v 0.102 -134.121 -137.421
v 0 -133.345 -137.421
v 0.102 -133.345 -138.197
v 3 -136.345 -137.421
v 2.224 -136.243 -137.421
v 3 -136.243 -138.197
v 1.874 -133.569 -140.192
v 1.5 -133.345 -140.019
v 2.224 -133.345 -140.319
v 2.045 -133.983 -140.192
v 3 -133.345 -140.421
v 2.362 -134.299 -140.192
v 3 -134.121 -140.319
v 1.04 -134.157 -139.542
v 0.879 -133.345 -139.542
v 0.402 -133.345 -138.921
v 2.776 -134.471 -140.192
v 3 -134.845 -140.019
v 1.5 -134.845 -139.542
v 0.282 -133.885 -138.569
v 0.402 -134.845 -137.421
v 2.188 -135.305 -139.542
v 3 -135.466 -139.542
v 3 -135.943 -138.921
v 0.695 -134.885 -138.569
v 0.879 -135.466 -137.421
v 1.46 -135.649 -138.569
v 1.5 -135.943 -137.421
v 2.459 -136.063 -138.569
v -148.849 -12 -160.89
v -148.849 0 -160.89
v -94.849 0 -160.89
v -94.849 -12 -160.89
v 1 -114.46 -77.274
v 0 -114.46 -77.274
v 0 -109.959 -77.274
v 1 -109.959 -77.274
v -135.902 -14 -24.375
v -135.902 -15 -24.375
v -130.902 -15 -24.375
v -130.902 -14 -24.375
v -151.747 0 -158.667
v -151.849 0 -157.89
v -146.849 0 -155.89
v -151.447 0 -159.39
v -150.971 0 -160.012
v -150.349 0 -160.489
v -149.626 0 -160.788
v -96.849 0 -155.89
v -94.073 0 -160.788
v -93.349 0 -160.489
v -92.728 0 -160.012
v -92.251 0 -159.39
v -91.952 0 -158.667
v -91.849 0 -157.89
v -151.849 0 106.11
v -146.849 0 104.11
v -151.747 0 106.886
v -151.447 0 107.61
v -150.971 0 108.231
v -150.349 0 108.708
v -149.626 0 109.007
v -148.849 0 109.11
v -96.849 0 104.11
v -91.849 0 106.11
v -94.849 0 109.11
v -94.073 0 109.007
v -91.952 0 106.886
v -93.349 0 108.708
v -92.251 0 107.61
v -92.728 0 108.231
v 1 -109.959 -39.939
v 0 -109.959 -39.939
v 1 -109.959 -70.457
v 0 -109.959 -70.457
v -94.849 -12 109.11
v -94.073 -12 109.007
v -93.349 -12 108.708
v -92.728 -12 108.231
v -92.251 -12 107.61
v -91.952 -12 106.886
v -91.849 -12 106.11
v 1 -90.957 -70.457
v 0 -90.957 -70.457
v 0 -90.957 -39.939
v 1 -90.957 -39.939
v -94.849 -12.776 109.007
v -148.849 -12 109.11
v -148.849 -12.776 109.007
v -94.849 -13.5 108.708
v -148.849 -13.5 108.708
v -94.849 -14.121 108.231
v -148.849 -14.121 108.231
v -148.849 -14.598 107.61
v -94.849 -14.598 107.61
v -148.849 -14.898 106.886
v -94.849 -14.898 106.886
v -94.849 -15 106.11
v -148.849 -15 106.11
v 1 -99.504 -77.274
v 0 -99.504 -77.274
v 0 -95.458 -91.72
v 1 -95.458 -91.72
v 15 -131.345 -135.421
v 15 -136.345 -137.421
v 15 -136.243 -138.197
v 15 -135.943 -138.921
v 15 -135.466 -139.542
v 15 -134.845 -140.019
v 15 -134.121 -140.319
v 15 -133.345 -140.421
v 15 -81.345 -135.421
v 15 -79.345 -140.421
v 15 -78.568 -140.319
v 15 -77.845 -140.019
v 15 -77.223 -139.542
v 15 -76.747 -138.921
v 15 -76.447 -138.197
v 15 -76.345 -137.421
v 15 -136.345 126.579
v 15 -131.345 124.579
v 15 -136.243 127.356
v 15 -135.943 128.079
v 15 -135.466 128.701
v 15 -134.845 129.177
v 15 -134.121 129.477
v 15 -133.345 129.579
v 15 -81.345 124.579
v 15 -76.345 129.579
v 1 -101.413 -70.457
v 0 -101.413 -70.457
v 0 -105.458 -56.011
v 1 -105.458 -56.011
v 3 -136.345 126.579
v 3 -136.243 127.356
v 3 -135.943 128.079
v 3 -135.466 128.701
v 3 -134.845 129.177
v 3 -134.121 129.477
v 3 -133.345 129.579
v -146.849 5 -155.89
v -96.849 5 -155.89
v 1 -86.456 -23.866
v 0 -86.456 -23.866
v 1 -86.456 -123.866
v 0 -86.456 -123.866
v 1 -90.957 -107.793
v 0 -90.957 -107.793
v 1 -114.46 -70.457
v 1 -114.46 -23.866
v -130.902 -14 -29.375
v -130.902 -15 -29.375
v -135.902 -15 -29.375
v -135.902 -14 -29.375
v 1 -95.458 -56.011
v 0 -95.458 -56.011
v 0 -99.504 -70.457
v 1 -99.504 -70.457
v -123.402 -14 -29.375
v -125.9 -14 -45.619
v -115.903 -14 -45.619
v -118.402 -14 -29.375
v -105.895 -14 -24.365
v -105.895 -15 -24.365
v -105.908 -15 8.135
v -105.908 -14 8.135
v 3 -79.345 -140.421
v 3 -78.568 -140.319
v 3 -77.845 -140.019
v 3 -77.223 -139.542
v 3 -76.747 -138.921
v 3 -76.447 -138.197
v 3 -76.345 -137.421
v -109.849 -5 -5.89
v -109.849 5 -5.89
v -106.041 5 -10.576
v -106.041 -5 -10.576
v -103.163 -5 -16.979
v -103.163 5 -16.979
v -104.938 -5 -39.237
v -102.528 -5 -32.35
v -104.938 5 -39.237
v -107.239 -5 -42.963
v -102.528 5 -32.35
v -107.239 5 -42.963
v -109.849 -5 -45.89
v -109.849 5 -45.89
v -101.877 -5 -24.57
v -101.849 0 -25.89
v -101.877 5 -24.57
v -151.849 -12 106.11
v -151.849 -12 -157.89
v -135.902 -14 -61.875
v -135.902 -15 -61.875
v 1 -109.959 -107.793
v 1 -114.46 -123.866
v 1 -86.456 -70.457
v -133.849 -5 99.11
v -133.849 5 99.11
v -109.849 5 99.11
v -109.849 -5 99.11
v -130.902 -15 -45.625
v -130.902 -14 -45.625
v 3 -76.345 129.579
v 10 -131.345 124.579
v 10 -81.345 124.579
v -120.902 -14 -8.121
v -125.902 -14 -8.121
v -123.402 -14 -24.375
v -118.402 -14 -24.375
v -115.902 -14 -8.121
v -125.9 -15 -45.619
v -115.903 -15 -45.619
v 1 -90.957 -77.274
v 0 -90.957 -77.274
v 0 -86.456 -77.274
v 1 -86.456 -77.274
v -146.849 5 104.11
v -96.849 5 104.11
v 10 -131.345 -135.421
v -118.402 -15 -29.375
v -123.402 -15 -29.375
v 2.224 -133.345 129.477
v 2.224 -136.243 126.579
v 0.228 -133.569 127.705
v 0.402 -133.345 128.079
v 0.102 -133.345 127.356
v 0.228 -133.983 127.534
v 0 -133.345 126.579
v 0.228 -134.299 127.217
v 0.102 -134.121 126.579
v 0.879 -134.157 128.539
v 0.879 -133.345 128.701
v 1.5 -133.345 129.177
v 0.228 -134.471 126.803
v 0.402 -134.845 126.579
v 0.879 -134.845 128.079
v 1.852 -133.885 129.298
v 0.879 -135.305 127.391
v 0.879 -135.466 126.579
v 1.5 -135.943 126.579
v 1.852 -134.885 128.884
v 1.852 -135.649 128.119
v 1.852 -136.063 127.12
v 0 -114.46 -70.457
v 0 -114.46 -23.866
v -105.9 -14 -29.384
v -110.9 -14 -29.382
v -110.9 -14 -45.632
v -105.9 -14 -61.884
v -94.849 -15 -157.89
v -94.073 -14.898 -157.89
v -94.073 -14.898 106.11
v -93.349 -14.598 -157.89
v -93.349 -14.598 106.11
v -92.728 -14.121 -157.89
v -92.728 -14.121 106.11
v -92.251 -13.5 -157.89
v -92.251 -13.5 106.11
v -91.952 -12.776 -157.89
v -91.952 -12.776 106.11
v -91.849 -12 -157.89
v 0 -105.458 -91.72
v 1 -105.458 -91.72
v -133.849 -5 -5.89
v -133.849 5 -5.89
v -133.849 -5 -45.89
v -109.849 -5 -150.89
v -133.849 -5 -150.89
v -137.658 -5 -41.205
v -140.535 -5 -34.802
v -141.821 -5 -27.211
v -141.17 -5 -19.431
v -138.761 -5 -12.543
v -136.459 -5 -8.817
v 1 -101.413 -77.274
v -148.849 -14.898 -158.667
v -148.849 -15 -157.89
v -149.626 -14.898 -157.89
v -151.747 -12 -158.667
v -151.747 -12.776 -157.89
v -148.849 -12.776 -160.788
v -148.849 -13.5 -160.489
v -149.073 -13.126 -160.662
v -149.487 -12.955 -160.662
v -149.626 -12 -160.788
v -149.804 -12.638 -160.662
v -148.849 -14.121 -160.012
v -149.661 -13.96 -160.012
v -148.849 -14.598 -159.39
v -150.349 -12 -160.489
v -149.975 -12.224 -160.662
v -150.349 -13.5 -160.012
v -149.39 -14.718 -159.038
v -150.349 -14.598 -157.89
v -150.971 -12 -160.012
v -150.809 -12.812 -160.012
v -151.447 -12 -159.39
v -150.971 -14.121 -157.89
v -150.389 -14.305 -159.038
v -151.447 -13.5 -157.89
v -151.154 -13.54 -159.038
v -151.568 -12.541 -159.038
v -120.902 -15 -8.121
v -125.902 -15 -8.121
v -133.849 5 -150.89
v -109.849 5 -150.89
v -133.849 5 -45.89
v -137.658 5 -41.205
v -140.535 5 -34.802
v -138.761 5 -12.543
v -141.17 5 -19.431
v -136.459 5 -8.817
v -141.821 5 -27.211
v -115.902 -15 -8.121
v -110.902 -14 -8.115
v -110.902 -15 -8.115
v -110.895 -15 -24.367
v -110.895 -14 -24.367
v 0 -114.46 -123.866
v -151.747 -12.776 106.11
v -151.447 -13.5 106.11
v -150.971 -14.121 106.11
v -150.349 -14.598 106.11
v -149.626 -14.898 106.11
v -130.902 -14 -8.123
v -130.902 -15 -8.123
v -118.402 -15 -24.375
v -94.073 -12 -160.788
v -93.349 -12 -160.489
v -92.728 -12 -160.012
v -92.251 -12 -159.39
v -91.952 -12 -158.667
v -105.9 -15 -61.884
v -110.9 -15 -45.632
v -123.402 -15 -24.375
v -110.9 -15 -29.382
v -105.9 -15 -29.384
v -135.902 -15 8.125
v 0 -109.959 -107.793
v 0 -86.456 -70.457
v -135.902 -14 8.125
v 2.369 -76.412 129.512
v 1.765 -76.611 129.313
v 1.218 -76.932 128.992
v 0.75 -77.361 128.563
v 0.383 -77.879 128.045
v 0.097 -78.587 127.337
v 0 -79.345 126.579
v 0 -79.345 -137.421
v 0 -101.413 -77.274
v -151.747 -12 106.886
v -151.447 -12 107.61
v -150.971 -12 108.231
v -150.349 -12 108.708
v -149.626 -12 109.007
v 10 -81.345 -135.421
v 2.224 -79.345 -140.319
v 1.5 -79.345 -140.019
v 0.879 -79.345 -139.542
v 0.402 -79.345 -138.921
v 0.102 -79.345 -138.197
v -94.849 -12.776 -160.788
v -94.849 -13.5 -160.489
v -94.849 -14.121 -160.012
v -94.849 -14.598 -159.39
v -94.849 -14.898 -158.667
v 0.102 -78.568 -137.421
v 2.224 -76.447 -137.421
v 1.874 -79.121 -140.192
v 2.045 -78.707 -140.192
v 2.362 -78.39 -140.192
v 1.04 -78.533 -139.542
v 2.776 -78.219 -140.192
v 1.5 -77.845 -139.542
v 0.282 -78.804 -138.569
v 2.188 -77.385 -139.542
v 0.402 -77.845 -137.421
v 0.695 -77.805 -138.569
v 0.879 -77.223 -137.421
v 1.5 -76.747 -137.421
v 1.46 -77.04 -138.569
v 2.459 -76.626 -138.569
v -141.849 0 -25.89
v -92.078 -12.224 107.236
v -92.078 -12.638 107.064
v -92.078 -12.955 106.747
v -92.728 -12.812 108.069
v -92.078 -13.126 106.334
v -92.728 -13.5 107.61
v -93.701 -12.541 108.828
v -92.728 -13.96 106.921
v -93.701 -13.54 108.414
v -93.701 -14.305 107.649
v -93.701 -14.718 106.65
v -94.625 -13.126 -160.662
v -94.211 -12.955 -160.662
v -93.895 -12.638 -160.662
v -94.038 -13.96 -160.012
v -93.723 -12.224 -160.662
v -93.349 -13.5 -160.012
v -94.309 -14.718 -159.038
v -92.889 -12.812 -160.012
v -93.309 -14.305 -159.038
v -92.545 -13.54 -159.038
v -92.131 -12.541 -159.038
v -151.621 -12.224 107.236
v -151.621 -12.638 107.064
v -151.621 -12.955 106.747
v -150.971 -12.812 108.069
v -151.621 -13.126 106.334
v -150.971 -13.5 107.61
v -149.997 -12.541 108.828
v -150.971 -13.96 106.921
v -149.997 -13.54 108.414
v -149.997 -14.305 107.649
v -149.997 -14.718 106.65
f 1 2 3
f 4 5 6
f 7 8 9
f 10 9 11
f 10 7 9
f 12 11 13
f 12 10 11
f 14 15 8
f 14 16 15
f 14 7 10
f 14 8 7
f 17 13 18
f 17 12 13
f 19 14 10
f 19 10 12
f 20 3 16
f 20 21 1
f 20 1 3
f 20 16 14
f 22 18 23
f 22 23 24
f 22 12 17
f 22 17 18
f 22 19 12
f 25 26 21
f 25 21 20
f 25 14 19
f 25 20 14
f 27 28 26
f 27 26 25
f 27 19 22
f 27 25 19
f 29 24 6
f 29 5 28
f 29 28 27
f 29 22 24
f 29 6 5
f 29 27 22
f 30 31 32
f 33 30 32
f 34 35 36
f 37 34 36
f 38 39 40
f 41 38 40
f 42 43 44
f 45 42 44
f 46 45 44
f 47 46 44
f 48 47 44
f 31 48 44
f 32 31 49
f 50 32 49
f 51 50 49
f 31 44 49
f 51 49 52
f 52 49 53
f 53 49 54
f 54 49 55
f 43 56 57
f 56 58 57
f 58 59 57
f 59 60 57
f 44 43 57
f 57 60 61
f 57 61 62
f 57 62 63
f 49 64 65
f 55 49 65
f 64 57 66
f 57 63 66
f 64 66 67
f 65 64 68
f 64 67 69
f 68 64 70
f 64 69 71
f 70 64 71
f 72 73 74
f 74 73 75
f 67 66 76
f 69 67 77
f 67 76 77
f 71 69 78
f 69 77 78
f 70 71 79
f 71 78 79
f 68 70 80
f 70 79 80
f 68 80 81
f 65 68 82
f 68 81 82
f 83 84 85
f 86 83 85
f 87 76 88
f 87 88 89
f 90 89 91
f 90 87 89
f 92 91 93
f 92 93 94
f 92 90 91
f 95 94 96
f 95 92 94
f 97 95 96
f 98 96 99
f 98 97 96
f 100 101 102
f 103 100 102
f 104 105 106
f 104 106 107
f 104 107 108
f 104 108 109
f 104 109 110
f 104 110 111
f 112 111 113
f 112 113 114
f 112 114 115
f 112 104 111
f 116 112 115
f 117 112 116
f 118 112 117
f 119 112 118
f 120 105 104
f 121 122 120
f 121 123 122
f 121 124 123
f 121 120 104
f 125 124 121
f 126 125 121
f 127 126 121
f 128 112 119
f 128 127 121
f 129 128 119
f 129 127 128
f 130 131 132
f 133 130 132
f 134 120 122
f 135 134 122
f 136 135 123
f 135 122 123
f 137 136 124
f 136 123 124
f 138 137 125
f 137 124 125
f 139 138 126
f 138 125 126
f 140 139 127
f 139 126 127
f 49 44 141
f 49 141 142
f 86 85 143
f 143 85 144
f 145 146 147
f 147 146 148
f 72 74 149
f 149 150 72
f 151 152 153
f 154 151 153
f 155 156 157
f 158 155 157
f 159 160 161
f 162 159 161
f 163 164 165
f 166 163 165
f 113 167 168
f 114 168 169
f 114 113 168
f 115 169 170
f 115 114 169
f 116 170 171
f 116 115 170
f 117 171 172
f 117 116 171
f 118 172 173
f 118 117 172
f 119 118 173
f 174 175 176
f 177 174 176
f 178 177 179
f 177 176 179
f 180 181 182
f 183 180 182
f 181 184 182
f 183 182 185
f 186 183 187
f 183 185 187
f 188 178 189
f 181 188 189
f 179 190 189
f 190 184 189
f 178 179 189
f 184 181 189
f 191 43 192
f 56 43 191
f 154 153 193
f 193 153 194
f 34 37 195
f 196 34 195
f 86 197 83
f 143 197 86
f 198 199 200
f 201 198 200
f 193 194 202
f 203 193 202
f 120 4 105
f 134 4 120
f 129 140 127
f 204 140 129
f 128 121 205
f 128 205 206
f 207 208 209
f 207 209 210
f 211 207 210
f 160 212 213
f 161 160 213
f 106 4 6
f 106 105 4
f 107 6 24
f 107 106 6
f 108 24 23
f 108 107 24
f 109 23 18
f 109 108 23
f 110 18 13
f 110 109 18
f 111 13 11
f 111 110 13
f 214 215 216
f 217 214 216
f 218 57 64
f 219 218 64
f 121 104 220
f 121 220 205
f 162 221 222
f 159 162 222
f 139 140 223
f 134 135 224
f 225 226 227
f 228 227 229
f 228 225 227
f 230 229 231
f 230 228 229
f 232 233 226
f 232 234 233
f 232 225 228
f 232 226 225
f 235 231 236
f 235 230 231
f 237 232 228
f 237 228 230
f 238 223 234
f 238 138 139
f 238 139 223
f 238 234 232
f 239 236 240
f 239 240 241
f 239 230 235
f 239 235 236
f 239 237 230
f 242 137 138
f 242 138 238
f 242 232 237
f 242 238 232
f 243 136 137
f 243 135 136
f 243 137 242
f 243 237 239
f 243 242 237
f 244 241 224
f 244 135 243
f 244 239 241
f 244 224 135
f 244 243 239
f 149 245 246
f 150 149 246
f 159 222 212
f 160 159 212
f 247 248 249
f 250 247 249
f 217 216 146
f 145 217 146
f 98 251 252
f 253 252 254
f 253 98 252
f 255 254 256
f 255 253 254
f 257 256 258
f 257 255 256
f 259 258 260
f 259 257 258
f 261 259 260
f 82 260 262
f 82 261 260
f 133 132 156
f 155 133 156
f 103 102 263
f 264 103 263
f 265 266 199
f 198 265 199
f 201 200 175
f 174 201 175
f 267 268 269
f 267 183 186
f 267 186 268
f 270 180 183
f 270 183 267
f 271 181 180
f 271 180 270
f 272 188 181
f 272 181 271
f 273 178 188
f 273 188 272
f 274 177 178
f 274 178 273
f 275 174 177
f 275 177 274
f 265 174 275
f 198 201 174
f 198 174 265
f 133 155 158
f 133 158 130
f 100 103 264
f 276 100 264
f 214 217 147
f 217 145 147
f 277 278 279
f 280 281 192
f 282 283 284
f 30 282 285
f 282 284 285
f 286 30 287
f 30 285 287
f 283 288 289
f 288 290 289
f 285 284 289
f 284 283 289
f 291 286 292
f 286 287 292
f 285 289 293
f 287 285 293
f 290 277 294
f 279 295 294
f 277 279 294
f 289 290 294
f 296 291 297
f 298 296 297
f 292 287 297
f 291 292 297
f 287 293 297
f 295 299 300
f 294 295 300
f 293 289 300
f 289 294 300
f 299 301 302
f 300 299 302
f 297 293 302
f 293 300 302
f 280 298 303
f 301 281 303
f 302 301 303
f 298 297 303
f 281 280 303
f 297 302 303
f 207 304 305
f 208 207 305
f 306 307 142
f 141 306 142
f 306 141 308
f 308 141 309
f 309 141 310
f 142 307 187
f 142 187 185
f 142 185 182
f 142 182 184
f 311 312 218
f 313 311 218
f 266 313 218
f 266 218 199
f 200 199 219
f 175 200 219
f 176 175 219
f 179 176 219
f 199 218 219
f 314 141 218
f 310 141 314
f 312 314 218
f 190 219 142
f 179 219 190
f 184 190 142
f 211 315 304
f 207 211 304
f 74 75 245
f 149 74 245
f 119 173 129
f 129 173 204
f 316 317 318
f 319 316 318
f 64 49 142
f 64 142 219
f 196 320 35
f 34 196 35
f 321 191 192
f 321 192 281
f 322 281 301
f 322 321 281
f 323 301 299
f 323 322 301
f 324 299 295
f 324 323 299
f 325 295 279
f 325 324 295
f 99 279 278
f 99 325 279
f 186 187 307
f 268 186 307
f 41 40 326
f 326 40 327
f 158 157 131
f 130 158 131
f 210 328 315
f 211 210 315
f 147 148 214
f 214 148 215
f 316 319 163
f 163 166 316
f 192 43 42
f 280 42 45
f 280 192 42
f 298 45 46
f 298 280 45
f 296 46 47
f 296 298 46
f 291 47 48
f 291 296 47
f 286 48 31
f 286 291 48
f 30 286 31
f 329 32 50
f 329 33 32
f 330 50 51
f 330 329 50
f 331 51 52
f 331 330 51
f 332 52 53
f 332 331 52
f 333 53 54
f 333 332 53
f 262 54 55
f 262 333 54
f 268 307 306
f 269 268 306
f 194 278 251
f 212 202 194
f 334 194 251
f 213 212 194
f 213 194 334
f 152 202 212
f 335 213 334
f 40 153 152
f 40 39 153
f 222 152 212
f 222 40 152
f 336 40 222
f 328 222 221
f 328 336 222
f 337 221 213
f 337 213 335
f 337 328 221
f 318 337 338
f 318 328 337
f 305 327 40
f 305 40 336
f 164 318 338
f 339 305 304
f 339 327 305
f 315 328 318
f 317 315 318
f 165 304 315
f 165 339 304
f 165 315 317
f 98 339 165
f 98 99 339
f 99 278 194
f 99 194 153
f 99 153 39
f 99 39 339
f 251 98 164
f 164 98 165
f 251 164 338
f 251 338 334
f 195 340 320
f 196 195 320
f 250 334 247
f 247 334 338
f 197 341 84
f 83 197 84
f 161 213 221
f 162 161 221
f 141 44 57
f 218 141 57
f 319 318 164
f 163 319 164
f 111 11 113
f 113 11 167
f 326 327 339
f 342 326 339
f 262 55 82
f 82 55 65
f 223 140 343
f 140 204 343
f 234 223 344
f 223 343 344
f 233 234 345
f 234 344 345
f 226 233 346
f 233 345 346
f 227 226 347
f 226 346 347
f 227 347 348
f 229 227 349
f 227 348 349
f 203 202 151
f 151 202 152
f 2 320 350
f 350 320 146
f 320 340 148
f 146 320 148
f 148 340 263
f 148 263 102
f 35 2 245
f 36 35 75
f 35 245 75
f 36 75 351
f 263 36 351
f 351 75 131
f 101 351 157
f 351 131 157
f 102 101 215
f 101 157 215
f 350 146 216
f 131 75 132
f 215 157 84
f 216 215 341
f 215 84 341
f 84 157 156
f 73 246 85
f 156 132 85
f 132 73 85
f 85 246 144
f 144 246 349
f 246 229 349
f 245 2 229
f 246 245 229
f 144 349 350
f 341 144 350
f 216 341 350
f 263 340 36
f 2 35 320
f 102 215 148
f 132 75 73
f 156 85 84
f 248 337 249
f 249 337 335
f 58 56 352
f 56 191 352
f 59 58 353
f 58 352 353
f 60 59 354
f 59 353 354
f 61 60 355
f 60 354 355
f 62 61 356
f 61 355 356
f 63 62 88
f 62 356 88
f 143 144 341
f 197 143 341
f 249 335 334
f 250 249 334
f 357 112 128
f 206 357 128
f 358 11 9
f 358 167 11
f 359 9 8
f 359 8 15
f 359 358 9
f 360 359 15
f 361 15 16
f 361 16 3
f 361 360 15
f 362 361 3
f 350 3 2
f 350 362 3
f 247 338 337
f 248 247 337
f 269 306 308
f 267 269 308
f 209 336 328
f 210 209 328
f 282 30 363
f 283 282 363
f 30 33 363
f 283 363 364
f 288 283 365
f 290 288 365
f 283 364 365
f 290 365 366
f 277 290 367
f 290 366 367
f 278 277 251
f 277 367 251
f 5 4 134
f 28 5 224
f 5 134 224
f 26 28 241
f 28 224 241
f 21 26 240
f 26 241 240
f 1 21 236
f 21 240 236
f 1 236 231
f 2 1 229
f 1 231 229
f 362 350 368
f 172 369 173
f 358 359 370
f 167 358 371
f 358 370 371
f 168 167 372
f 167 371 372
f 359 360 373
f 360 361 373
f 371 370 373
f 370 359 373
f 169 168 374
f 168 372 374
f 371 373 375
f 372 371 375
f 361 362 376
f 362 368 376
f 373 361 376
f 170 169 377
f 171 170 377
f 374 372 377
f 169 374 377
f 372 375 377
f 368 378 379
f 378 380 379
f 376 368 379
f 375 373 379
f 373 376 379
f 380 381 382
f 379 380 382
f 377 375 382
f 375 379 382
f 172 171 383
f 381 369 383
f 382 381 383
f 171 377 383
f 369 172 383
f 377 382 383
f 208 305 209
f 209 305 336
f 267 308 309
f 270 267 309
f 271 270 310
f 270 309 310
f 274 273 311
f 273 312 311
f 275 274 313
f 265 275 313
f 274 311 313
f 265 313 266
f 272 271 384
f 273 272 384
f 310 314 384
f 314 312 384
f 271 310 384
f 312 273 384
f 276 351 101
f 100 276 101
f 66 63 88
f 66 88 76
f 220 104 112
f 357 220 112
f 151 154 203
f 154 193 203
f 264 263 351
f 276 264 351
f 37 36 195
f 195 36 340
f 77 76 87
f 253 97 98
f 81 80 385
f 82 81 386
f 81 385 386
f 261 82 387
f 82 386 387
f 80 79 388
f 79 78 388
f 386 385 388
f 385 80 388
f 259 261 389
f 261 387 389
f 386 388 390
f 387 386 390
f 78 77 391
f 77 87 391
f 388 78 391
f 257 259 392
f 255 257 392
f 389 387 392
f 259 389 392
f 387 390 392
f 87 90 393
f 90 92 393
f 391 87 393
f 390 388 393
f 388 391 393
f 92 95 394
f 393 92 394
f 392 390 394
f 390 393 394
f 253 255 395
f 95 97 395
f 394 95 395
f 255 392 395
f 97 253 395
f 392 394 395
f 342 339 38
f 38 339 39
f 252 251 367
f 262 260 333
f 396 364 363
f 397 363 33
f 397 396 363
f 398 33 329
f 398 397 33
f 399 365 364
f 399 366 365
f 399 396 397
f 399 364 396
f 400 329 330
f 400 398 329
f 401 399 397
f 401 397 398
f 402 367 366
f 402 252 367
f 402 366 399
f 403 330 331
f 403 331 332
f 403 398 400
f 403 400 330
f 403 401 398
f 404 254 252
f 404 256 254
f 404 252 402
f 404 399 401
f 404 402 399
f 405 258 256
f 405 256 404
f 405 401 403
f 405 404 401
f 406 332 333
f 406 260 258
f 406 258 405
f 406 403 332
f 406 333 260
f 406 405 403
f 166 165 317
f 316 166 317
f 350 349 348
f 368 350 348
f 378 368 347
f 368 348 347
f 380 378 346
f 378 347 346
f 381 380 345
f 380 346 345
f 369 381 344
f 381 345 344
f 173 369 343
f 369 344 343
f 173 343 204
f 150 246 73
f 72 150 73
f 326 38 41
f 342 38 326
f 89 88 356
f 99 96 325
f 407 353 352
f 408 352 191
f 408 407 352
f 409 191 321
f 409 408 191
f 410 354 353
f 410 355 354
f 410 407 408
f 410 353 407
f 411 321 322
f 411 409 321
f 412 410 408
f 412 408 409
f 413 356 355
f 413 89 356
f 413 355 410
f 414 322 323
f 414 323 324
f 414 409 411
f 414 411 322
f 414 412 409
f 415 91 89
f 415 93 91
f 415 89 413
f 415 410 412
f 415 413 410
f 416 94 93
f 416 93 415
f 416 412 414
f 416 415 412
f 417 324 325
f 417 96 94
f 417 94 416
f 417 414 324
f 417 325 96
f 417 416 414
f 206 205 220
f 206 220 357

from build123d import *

# Parameters (mm, degrees)
F0_W      = 60
F0_H      = 270
F2_DEPTH  = 15
F3_W      = 50
F3_H      = 260
F4_DEPTH  = 5
F1_W      = 60
F1_H      = 270
F5_DEPTH  = 15
F6_W      = 50
F6_H      = 260
F7_DEPTH  = 5
F9_DEPTH  = 10
F10_R     = 3
F11_R     = 3
F13_DEPTH = 1
F15_DEPTH = 1


# Not quite as in the source:
# - a feature names something its author has since deleted; it is built from what else it names


with BuildPart() as f2:
    # F0 (on Front) → F2 (new body)
    with BuildSketch(Plane.XZ):
        with Locations((-121.8493213905, -25.8904273567)):
            Rectangle(F0_W, F0_H)
    extrude(amount=F2_DEPTH)

    # F3 (on face) → F4 (join)
    with BuildSketch(Plane.XZ):
        with Locations((-121.8493213905, -25.8904273567)):
            Rectangle(F3_W, F3_H)
    extrude(amount=-F4_DEPTH)

    # F8 (on face) → F9 (cut)
    with BuildSketch(Plane(origin=(0, 5, 0), x_dir=(-1, 0, 0), z_dir=(0, 1, 0))):
        with BuildLine():
            Line((109.8493213905, -150.8904273567), (133.8493213905, -150.8904273567))
            Line((133.8493213905, -150.8904273567), (133.8493213905, -45.8904273567))
            add(Edge.make_bspline(
                [(109.8493213905, -45.8904273567), (121.8493213905, -57.1404273567), (133.8493213905, -45.8904273567)],
                knots=[2.4980915448, 2.4980915448, 2.4980915448, 3.7850937624, 3.7850937624, 3.7850937624], degree=2, weights=[1, 0.8, 1]))
            Line((109.8493213905, -45.8904273567), (109.8493213905, -150.8904273567))
        make_face()
        with BuildLine():
            add(Edge.make_bspline(
                [(133.8493213905, -5.8904273567), (128.5159880572, -0.8904273567), (121.8493213905, -0.8904273567)],
                knots=[5.6396841984, 5.6396841984, 5.6396841984, 6.2831853072, 6.2831853072, 6.2831853072], degree=2, weights=[1, 0.9486832981, 1]))
            Line((133.8493213905, -5.8904273567), (133.8493213905, 99.1095726433))
            Line((133.8493213905, 99.1095726433), (109.8493213905, 99.1095726433))
            Line((109.8493213905, 99.1095726433), (109.8493213905, -5.8904273567))
            add(Edge.make_bspline(
                [(121.8493213905, -0.8904273567), (115.1826547239, -0.8904273567), (109.8493213905, -5.8904273567)],
                knots=[0, 0, 0, 0.6435011088, 0.6435011088, 0.6435011088], degree=2, weights=[1, 0.9486832981, 1]))
        make_face()
        with BuildLine():
            Line((133.8493213905, -5.8904273567), (133.8493213905, -45.8904273567))
            add(Edge.make_bspline(
                [(133.8493213905, -45.8904273567), (155.1826547239, -25.8904273567), (133.8493213905, -5.8904273567)],
                knots=[3.7850937624, 3.7850937624, 3.7850937624, 5.6396841984, 5.6396841984, 5.6396841984], degree=2, weights=[1, 0.6, 1]))
        make_face()
        with BuildLine():
            add(Edge.make_bspline(
                [(109.8493213905, -45.8904273567), (121.8493213905, -57.1404273567), (133.8493213905, -45.8904273567)],
                knots=[2.4980915448, 2.4980915448, 2.4980915448, 3.7850937624, 3.7850937624, 3.7850937624], degree=2, weights=[1, 0.8, 1]))
            Line((133.8493213905, -45.8904273567), (133.8493213905, -5.8904273567))
            add(Edge.make_bspline(
                [(133.8493213905, -5.8904273567), (128.5159880572, -0.8904273567), (121.8493213905, -0.8904273567)],
                knots=[5.6396841984, 5.6396841984, 5.6396841984, 6.2831853072, 6.2831853072, 6.2831853072], degree=2, weights=[1, 0.9486832981, 1]))
            add(Edge.make_bspline(
                [(121.8493213905, -0.8904273567), (115.1826547239, -0.8904273567), (109.8493213905, -5.8904273567)],
                knots=[0, 0, 0, 0.6435011088, 0.6435011088, 0.6435011088], degree=2, weights=[1, 0.9486832981, 1]))
            Line((109.8493213905, -5.8904273567), (109.8493213905, -45.8904273567))
        make_face()
        with BuildLine():
            add(Edge.make_bspline(
                [(109.8493213905, -5.8904273567), (88.5159880572, -25.8904273567), (109.8493213905, -45.8904273567)],
                knots=[0.6435011088, 0.6435011088, 0.6435011088, 2.4980915448, 2.4980915448, 2.4980915448], degree=2, weights=[1, 0.6, 1]))
            Line((109.8493213905, -45.8904273567), (109.8493213905, -5.8904273567))
        make_face()
    extrude(amount=-F9_DEPTH, mode=Mode.SUBTRACT)

    # F10
    f10_edges = [f2.edges().sort_by_distance(p)[0] for p in [
        (-121.849321, -15, 109.109573),
        (-151.849321, -7.5, 109.109573),
        (-91.849321, -7.5, 109.109573),
        (-91.849321, -15, -25.890427),
        (-151.849321, -15, -25.890427),
        (-121.849321, -15, -160.890427),
        (-151.849321, -7.5, -160.890427),
        (-91.849321, -7.5, -160.890427),
    ]]
    fillet(f10_edges, radius=F10_R)

    # F14 (on face) → F15 (cut)
    with BuildSketch(Plane.XZ.offset(15)):
        Polygon((-135.9017485874, 8.1252877414), (-135.9017485874, -24.3747122586), (-130.9017485874, -24.3747122586), (-130.9017485874, -8.1227890678), align=None)
        Polygon((-120.9017493272, -8.1208656498), (-125.9017493272, -8.1208658774), (-123.4017485874, -24.3747122586), (-118.4017485874, -24.3747122586), (-115.9017493272, -8.1208654223), align=None)
        Polygon((-105.9080004363, 8.1349024923), (-110.9017504368, -8.1150963056), (-110.8954993276, -24.3670182942), (-105.8954996975, -24.3650951036), align=None)
        Polygon((-130.9017485874, -29.3747122586), (-135.9017485874, -29.3747122586), (-135.9017485874, -45.6247122586), (-135.9017485874, -61.8747122586), (-130.9017485874, -45.6247122586), align=None)
        Polygon((-105.8998287257, -29.3843281183), (-110.8998283559, -29.3824049277), (-110.8998283559, -45.6324049277), (-105.8998287257, -61.8843281183), align=None)
        Polygon((-123.4017485874, -29.3747122586), (-125.9002702644, -45.6189424591), (-115.903228459, -45.6189424591), (-118.4017485874, -29.3747122586), align=None)
    extrude(amount=-F15_DEPTH, mode=Mode.SUBTRACT)


with BuildPart() as f5:
    # F1 (on Right) → F5 (new body)
    with BuildSketch(Plane.YZ):
        with Locations((-106.3447256267, -5.4207965732)):
            Rectangle(F1_W, F1_H)
    extrude(amount=F5_DEPTH)

    # F6 (on face) → F7 (cut)
    with BuildSketch(Plane.YZ.offset(15)):
        with Locations((-106.3447256267, -5.4207965732)):
            Rectangle(F6_W, F6_H)
    extrude(amount=-F7_DEPTH, mode=Mode.SUBTRACT)

    # F11
    f11_edges = [f5.edges().sort_by_distance(p)[0] for p in [
        (7.5, -136.344726, 129.579203),
        (0, -106.344726, 129.579203),
        (0, -136.344726, -5.420797),
        (0, -76.344726, -5.420797),
        (0, -106.344726, -140.420797),
        (7.5, -76.344726, -140.420797),
        (7.5, -136.344726, -140.420797),
    ]]
    fillet(f11_edges, radius=F11_R)

    # F12 (on face) → F13 (cut)
    with BuildSketch(Plane(origin=(0, 0, 0), x_dir=(0, -1, 0), z_dir=(-1, 0, 0))):
        Polygon((105.4581373974, -56.0113014256), (95.4581373974, -56.0113014256), (99.5036673885, -70.4574153882), (101.4126074063, -70.4574153882), align=None)
        Polygon((90.9570677645, -70.4574153882), (90.9570677645, -39.9385087348), (86.4559981315, -23.8657160441), (86.4559981315, -70.4574153882), align=None)
        Polygon((114.4602766633, -23.8657160441), (109.9592070304, -39.9385087348), (109.9592070304, -70.4574153882), (114.4602766633, -70.4574153882), align=None)
        Polygon((109.9592070304, -77.2740167), (109.9592070304, -107.7929233534), (114.4602766633, -123.8657160441), (114.4602766633, -77.2740167), align=None)
        Polygon((99.5036673885, -77.2740167), (95.4581373974, -91.7201306627), (105.4581373974, -91.7201306627), (101.4126074063, -77.2740167), align=None)
        Polygon((86.4559981315, -123.8657160441), (90.9570677645, -107.7929233534), (90.9570677645, -77.2740167), (86.4559981315, -77.2740167), align=None)
    extrude(amount=-F13_DEPTH, mode=Mode.SUBTRACT)


solid = Compound([f2.part, f5.part])
